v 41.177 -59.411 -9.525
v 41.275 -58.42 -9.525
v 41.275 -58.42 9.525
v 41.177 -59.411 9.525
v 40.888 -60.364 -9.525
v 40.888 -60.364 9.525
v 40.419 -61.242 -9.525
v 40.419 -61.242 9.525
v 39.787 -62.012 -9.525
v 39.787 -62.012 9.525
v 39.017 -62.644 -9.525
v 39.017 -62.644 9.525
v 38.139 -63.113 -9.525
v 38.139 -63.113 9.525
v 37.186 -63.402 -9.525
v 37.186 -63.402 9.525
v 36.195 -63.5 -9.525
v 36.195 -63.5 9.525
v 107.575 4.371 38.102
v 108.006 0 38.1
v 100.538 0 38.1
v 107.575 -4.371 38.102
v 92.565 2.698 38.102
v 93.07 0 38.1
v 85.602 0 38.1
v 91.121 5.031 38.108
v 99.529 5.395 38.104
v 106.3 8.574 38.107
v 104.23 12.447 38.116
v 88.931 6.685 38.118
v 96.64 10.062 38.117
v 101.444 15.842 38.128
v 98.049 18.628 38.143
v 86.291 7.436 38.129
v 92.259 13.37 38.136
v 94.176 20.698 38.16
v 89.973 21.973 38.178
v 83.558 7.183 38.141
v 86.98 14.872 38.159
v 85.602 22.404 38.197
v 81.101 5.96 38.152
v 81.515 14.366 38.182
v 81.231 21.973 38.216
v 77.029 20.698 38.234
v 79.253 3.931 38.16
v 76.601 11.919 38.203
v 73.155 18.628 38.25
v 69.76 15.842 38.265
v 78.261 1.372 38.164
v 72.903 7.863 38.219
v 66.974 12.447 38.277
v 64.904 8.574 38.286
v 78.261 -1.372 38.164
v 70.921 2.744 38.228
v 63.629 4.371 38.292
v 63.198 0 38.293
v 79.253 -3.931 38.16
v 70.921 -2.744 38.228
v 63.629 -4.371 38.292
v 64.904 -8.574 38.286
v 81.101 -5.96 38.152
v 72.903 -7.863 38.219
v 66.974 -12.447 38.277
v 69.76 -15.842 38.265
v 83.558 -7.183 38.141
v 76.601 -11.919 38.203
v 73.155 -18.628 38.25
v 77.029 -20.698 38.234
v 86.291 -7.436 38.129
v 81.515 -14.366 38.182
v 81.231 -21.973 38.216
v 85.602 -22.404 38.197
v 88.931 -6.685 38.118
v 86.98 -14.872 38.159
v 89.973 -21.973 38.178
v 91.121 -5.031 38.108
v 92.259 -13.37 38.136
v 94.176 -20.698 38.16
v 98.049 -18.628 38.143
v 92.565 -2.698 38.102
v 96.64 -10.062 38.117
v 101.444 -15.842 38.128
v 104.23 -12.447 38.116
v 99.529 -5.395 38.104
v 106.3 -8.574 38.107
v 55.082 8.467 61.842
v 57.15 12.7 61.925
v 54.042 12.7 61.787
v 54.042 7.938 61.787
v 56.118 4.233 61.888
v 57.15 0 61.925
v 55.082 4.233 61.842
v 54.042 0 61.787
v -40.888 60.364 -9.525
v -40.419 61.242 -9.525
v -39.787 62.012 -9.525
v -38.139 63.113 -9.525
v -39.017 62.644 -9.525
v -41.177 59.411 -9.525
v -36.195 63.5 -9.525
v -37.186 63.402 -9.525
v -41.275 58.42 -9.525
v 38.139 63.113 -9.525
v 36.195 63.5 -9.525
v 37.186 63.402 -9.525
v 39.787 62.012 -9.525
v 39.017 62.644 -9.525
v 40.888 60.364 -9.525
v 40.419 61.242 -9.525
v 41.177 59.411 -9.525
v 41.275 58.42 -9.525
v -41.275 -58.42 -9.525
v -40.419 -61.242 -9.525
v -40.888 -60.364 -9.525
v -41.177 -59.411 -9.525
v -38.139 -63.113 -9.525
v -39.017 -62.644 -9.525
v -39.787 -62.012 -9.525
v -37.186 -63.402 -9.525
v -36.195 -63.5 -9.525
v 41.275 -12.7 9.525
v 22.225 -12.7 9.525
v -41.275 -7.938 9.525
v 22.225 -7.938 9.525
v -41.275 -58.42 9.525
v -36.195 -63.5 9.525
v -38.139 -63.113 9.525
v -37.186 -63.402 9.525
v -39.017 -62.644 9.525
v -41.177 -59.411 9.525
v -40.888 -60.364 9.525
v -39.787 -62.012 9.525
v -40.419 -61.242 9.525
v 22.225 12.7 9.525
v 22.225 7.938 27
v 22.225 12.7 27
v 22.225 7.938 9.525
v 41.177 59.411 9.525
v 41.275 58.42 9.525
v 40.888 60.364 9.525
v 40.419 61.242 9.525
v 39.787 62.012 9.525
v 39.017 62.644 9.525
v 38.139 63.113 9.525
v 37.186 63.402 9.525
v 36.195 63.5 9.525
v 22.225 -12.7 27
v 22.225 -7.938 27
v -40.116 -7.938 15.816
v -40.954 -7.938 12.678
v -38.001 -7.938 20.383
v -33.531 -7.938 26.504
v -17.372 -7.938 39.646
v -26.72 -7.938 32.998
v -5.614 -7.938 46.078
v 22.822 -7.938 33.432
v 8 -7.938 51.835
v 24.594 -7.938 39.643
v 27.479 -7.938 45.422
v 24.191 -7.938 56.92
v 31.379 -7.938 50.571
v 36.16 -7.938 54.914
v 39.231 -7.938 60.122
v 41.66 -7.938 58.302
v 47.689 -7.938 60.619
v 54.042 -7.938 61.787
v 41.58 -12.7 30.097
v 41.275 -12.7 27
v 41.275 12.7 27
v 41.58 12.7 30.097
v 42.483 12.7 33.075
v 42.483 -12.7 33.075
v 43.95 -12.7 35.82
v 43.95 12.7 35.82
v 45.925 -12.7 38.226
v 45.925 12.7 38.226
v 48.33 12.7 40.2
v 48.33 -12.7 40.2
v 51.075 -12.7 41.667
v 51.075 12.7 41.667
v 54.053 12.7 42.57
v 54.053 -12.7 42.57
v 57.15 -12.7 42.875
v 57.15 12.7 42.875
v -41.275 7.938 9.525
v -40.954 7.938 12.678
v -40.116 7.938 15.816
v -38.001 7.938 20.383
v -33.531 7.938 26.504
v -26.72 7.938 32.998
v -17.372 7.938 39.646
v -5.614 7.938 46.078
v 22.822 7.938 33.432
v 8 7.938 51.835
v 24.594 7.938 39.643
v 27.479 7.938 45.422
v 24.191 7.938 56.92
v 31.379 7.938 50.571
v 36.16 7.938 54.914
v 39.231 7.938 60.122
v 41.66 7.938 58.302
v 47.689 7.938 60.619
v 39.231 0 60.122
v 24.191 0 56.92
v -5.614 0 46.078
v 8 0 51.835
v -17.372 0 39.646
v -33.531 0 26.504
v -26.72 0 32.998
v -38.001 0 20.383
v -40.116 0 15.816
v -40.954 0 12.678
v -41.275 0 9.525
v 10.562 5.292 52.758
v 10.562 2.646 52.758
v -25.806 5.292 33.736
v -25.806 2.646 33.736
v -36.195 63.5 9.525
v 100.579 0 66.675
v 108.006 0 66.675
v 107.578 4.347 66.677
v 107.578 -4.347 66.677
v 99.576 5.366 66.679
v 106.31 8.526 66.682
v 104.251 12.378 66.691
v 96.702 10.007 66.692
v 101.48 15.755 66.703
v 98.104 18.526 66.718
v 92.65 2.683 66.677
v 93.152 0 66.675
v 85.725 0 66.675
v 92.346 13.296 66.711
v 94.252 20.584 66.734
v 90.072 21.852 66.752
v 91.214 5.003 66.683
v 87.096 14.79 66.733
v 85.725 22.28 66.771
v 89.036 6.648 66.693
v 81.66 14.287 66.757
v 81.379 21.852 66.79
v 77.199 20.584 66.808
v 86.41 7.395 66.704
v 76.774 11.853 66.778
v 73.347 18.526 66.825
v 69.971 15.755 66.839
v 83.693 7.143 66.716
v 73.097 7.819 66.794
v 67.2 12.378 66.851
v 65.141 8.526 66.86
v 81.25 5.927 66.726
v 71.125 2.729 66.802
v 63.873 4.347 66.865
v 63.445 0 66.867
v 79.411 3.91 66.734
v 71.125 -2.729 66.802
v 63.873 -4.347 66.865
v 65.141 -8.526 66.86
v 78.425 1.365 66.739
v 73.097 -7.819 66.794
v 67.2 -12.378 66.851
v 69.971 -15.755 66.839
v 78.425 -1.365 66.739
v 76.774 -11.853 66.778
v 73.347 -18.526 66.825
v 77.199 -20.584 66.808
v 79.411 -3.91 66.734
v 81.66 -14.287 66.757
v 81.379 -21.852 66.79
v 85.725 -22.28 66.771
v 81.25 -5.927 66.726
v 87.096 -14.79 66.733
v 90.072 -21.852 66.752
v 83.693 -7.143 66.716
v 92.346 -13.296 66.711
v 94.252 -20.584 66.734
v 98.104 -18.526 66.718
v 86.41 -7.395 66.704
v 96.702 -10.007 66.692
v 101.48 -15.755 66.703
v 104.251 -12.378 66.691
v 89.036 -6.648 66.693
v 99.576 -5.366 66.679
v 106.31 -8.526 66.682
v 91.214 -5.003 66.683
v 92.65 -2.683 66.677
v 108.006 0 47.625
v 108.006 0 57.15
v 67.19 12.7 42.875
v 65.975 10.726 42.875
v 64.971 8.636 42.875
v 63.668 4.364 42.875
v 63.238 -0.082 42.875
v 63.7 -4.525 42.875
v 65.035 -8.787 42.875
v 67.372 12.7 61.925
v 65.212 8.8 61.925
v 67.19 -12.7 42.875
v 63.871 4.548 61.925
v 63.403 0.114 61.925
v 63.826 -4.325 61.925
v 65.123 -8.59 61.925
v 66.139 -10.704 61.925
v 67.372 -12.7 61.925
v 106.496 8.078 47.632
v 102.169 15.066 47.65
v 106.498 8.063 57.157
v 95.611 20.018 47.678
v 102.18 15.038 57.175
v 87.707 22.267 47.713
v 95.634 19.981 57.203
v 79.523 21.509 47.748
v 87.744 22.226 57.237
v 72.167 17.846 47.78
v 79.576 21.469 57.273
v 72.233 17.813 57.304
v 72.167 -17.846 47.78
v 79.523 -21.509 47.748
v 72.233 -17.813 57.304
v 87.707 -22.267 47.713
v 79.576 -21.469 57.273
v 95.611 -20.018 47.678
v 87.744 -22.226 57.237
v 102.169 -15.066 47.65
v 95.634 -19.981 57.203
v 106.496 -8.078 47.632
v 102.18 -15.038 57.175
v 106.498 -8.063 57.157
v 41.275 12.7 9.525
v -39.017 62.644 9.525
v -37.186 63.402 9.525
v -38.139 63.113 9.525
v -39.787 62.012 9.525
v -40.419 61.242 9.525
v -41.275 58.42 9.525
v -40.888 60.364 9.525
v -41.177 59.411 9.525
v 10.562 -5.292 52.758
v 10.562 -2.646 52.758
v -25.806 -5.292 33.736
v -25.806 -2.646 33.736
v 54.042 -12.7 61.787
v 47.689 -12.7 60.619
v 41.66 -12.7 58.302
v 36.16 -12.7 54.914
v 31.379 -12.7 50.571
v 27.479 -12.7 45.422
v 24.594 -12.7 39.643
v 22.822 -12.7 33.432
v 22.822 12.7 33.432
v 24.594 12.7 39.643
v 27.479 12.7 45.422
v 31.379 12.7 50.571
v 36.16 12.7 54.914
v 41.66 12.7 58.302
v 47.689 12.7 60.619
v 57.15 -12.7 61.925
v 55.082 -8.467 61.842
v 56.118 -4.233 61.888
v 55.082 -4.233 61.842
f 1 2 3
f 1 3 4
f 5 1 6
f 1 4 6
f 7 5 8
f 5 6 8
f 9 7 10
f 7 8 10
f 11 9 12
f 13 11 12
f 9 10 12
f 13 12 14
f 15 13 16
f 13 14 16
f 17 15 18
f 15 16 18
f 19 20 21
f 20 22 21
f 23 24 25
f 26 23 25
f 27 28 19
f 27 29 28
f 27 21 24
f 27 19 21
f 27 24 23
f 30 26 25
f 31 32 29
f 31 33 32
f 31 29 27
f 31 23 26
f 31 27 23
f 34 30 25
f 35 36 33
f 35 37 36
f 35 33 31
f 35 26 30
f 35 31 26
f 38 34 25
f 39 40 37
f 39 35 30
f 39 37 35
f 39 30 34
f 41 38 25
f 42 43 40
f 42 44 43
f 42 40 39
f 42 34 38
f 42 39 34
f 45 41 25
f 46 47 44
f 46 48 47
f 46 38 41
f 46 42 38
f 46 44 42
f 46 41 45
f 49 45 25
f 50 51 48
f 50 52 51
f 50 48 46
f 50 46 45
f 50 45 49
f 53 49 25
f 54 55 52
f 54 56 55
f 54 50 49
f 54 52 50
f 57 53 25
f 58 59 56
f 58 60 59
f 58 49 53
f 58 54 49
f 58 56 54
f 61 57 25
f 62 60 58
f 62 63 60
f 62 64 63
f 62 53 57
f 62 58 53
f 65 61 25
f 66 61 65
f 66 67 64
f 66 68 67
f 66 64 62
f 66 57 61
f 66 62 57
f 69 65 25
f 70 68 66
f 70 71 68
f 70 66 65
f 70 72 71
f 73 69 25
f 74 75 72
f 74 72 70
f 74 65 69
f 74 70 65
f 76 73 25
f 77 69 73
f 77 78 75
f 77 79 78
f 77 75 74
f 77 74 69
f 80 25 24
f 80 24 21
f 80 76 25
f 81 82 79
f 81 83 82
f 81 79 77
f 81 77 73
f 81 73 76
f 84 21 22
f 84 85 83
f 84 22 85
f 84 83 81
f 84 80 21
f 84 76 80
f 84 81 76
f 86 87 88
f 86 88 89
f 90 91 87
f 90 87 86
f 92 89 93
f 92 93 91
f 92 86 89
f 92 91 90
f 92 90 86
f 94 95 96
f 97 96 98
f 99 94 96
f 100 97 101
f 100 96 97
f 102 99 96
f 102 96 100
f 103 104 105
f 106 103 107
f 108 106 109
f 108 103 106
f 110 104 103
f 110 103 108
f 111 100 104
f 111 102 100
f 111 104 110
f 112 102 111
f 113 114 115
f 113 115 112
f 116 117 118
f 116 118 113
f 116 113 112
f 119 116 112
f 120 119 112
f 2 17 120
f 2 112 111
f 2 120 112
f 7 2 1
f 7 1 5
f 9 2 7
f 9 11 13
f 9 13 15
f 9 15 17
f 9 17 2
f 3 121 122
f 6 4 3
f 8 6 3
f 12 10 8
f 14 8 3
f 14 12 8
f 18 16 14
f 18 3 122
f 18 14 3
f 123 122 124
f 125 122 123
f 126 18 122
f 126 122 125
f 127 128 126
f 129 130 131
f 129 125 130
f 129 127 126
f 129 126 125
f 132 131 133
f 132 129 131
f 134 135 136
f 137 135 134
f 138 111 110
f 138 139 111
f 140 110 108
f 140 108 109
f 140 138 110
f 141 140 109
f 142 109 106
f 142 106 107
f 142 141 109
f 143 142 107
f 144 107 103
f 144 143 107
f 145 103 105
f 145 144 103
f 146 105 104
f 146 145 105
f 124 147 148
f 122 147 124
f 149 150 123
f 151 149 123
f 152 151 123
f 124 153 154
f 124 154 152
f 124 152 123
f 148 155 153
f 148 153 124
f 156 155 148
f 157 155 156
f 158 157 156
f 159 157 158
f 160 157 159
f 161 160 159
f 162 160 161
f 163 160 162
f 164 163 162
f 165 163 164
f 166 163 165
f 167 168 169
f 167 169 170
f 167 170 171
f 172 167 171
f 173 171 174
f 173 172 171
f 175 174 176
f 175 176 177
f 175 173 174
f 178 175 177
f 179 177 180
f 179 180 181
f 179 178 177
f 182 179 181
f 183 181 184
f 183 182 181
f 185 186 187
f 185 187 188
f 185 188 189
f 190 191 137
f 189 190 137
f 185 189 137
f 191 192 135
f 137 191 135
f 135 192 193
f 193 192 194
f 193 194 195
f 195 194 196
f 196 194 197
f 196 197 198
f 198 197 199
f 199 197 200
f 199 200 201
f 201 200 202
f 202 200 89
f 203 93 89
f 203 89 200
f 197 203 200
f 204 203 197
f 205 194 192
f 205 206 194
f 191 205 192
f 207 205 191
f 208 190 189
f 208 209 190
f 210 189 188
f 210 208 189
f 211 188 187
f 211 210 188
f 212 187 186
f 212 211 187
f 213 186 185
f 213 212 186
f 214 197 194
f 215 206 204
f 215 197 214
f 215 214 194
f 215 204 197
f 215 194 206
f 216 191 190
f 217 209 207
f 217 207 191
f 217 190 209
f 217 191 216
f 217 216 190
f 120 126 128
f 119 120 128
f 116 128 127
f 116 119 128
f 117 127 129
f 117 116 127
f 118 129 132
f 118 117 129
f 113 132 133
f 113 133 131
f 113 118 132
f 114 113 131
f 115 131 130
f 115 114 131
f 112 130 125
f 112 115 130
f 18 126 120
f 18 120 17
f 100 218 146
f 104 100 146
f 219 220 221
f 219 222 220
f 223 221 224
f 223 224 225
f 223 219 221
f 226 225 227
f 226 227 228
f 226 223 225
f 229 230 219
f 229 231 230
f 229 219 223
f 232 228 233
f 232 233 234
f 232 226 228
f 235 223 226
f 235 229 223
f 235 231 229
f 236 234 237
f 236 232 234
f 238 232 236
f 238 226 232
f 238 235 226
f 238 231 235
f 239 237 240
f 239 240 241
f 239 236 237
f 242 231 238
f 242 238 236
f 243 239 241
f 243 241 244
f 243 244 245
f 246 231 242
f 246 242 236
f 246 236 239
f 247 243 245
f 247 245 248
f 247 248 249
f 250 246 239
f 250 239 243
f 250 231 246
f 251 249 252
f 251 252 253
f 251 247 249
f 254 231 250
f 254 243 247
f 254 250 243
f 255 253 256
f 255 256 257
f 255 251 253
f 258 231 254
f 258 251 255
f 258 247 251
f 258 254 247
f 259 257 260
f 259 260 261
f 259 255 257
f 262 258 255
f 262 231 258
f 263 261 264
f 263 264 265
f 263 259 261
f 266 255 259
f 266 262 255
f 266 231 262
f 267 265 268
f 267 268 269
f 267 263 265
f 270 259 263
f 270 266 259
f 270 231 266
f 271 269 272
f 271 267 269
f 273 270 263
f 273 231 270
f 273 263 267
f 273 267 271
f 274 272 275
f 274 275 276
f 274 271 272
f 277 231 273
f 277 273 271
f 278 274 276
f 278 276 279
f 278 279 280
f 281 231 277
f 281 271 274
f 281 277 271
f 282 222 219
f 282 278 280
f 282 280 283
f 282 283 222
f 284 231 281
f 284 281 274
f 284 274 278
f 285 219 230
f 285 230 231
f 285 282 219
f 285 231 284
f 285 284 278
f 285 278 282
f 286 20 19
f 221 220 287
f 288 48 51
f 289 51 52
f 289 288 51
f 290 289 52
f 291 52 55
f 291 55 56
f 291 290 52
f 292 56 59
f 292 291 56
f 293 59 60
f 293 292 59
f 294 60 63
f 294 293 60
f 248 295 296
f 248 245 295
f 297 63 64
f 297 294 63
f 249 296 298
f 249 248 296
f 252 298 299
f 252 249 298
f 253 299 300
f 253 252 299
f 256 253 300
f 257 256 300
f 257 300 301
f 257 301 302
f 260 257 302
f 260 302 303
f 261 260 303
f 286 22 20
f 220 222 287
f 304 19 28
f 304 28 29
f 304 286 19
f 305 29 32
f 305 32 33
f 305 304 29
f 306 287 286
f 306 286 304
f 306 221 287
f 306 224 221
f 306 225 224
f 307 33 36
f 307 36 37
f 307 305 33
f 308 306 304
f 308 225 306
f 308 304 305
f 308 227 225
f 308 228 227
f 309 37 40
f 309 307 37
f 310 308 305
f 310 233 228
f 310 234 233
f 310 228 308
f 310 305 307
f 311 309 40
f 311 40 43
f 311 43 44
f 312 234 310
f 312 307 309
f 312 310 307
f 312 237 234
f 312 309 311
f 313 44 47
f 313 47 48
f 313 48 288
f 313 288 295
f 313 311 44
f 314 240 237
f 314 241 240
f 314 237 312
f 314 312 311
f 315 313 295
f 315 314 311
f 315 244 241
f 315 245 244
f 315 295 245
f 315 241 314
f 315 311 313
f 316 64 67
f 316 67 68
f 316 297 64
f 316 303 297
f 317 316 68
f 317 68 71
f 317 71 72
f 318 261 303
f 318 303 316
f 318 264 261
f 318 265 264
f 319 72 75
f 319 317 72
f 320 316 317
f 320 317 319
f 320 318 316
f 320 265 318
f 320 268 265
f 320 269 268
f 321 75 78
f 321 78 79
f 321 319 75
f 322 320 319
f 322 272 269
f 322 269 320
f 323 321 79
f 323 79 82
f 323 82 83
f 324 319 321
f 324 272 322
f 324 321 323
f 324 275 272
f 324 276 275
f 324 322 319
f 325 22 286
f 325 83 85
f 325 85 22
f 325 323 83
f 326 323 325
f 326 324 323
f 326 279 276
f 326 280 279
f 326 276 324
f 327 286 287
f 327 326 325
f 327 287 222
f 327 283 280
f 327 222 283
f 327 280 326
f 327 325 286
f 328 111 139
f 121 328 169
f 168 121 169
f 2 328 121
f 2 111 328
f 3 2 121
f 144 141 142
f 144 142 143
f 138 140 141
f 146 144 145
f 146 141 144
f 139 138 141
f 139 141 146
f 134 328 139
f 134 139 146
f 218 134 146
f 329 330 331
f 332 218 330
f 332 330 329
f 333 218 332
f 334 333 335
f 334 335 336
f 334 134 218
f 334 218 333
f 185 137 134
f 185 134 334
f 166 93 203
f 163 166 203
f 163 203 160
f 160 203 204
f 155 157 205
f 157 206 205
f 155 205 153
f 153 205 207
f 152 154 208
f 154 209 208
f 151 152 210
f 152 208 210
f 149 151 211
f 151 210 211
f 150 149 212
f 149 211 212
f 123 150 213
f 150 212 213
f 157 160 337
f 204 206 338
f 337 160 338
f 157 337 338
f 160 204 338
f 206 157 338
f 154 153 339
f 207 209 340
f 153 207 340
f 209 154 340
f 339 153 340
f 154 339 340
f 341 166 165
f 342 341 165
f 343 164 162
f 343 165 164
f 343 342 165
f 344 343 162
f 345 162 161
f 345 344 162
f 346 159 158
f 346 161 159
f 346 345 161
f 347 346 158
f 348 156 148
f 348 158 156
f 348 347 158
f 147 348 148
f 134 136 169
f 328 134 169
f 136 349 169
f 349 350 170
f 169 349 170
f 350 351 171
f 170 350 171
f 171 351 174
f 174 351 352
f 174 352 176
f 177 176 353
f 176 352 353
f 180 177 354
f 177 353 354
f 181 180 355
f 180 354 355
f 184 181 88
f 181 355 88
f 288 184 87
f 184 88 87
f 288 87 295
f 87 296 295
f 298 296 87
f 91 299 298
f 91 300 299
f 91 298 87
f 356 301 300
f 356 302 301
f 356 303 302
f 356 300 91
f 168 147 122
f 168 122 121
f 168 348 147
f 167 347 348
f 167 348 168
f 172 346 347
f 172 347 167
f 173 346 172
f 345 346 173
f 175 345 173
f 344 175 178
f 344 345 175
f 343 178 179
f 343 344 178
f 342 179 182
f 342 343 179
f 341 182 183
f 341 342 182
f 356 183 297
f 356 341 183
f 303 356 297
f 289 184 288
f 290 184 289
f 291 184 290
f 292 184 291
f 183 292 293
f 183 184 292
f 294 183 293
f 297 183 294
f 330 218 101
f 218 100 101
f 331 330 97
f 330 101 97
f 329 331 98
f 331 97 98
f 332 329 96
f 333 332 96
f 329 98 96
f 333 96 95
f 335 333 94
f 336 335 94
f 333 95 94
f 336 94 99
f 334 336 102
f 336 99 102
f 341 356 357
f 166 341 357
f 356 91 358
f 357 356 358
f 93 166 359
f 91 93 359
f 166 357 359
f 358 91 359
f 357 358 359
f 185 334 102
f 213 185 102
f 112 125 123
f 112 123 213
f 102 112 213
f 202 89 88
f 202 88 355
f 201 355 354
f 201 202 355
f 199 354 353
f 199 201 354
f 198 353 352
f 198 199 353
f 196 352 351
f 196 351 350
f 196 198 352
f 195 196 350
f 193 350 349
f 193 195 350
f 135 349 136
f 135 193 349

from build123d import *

# Parameters (mm, degrees)
F1_DEPTH = 63.5
F2_DEPTH = 12.7
F3_DEPTH = 7.9375
F5_R     = 5.08


with BuildPart() as f1:
    # F0 (on Front) → F1 (new body, symmetric)
    with BuildSketch(Plane.XZ):
        Polygon((41.275, -9.525), (41.275, 9.525), (22.225, 9.525), (-41.275, 9.525), (-41.275, -9.525), align=None)
    extrude(amount=F1_DEPTH, both=True)

    # F0 (on Front) → F2 (join, symmetric)
    with BuildSketch(Plane.XZ):
        with BuildLine():
            Line((22.225, 9.525), (41.275, 9.525))
            Line((41.275, 9.525), (41.275, 27.0002))
            ThreePointArc((41.275, 27.0002), (45.9246798487, 38.2255201513), (57.15, 42.8752))
            Line((57.15, 42.8752), (57.2056991218, 42.8752))
            Line((57.2056991218, 42.8752), (57.2056991218, 61.9252))
            Line((57.2056991218, 61.9252), (57.15, 61.9252))
            add(Edge.make_bspline(
                [(57.15, 61.9252), (56.1205296963, 61.8926068548), (55.0840965314, 61.8462999184), (54.0416201499, 61.786599637)],
                knots=[0, 0, 0, 0, 2.6733285205, 2.6733285205, 2.6733285205, 2.6733285205], degree=3))
            ThreePointArc((54.0416201499, 61.786599637), (31.3787389592, 50.5713206642), (22.225, 27.0002))
            Line((22.225, 27.0002), (22.225, 9.525))
        make_face()
        Polygon((57.2056991218, 61.9252), (57.2056991218, 42.8752), (85.6222819207, 42.8752), (85.7045002339, 61.9252), align=None)
    extrude(amount=F2_DEPTH, both=True)

    # F0 (on Front) → F3 (join, symmetric)
    with BuildSketch(Plane.XZ):
        with BuildLine():
            Line((-41.275, 9.525), (22.225, 9.525))
            Line((22.225, 9.525), (22.225, 27.0002))
            ThreePointArc((22.225, 27.0002), (31.3787389592, 50.5713206642), (54.0416201499, 61.786599637))
            add(Edge.make_bspline(
                [(54.0416201499, 61.786599637), (11.6024052654, 59.3562011022), (-40.8522579656, 34.7289555266), (-41.275, 9.525)],
                knots=[2.6733285205, 2.6733285205, 2.6733285205, 2.6733285205, 111.5045361635, 111.5045361635, 111.5045361635, 111.5045361635], degree=3))
        make_face()
    extrude(amount=F3_DEPTH, both=True)

    # F0 (on Front) → F4 (revolve)
    with BuildSketch(Plane.XZ):
        Polygon((85.7045002339, 61.9252), (85.6222819207, 42.8752), (85.6016725302, 38.1), (108.0056991218, 38.1), (108.0056991218, 66.675), (85.725, 66.675), align=None)
    revolve(axis=Axis((85.6633362651, 0, 52.3875), (0.0043158818, 0, 0.9999906865)))

    # F5
    f5_edges = [f1.edges().sort_by_distance(p)[0] for p in [
        (-41.275, 63.5, 0),
        (-41.275, -63.5, 0),
        (41.275, -63.5, 0),
        (41.275, 63.5, 0),
    ]]
    fillet(f5_edges, radius=F5_R)


solid = f1.part
